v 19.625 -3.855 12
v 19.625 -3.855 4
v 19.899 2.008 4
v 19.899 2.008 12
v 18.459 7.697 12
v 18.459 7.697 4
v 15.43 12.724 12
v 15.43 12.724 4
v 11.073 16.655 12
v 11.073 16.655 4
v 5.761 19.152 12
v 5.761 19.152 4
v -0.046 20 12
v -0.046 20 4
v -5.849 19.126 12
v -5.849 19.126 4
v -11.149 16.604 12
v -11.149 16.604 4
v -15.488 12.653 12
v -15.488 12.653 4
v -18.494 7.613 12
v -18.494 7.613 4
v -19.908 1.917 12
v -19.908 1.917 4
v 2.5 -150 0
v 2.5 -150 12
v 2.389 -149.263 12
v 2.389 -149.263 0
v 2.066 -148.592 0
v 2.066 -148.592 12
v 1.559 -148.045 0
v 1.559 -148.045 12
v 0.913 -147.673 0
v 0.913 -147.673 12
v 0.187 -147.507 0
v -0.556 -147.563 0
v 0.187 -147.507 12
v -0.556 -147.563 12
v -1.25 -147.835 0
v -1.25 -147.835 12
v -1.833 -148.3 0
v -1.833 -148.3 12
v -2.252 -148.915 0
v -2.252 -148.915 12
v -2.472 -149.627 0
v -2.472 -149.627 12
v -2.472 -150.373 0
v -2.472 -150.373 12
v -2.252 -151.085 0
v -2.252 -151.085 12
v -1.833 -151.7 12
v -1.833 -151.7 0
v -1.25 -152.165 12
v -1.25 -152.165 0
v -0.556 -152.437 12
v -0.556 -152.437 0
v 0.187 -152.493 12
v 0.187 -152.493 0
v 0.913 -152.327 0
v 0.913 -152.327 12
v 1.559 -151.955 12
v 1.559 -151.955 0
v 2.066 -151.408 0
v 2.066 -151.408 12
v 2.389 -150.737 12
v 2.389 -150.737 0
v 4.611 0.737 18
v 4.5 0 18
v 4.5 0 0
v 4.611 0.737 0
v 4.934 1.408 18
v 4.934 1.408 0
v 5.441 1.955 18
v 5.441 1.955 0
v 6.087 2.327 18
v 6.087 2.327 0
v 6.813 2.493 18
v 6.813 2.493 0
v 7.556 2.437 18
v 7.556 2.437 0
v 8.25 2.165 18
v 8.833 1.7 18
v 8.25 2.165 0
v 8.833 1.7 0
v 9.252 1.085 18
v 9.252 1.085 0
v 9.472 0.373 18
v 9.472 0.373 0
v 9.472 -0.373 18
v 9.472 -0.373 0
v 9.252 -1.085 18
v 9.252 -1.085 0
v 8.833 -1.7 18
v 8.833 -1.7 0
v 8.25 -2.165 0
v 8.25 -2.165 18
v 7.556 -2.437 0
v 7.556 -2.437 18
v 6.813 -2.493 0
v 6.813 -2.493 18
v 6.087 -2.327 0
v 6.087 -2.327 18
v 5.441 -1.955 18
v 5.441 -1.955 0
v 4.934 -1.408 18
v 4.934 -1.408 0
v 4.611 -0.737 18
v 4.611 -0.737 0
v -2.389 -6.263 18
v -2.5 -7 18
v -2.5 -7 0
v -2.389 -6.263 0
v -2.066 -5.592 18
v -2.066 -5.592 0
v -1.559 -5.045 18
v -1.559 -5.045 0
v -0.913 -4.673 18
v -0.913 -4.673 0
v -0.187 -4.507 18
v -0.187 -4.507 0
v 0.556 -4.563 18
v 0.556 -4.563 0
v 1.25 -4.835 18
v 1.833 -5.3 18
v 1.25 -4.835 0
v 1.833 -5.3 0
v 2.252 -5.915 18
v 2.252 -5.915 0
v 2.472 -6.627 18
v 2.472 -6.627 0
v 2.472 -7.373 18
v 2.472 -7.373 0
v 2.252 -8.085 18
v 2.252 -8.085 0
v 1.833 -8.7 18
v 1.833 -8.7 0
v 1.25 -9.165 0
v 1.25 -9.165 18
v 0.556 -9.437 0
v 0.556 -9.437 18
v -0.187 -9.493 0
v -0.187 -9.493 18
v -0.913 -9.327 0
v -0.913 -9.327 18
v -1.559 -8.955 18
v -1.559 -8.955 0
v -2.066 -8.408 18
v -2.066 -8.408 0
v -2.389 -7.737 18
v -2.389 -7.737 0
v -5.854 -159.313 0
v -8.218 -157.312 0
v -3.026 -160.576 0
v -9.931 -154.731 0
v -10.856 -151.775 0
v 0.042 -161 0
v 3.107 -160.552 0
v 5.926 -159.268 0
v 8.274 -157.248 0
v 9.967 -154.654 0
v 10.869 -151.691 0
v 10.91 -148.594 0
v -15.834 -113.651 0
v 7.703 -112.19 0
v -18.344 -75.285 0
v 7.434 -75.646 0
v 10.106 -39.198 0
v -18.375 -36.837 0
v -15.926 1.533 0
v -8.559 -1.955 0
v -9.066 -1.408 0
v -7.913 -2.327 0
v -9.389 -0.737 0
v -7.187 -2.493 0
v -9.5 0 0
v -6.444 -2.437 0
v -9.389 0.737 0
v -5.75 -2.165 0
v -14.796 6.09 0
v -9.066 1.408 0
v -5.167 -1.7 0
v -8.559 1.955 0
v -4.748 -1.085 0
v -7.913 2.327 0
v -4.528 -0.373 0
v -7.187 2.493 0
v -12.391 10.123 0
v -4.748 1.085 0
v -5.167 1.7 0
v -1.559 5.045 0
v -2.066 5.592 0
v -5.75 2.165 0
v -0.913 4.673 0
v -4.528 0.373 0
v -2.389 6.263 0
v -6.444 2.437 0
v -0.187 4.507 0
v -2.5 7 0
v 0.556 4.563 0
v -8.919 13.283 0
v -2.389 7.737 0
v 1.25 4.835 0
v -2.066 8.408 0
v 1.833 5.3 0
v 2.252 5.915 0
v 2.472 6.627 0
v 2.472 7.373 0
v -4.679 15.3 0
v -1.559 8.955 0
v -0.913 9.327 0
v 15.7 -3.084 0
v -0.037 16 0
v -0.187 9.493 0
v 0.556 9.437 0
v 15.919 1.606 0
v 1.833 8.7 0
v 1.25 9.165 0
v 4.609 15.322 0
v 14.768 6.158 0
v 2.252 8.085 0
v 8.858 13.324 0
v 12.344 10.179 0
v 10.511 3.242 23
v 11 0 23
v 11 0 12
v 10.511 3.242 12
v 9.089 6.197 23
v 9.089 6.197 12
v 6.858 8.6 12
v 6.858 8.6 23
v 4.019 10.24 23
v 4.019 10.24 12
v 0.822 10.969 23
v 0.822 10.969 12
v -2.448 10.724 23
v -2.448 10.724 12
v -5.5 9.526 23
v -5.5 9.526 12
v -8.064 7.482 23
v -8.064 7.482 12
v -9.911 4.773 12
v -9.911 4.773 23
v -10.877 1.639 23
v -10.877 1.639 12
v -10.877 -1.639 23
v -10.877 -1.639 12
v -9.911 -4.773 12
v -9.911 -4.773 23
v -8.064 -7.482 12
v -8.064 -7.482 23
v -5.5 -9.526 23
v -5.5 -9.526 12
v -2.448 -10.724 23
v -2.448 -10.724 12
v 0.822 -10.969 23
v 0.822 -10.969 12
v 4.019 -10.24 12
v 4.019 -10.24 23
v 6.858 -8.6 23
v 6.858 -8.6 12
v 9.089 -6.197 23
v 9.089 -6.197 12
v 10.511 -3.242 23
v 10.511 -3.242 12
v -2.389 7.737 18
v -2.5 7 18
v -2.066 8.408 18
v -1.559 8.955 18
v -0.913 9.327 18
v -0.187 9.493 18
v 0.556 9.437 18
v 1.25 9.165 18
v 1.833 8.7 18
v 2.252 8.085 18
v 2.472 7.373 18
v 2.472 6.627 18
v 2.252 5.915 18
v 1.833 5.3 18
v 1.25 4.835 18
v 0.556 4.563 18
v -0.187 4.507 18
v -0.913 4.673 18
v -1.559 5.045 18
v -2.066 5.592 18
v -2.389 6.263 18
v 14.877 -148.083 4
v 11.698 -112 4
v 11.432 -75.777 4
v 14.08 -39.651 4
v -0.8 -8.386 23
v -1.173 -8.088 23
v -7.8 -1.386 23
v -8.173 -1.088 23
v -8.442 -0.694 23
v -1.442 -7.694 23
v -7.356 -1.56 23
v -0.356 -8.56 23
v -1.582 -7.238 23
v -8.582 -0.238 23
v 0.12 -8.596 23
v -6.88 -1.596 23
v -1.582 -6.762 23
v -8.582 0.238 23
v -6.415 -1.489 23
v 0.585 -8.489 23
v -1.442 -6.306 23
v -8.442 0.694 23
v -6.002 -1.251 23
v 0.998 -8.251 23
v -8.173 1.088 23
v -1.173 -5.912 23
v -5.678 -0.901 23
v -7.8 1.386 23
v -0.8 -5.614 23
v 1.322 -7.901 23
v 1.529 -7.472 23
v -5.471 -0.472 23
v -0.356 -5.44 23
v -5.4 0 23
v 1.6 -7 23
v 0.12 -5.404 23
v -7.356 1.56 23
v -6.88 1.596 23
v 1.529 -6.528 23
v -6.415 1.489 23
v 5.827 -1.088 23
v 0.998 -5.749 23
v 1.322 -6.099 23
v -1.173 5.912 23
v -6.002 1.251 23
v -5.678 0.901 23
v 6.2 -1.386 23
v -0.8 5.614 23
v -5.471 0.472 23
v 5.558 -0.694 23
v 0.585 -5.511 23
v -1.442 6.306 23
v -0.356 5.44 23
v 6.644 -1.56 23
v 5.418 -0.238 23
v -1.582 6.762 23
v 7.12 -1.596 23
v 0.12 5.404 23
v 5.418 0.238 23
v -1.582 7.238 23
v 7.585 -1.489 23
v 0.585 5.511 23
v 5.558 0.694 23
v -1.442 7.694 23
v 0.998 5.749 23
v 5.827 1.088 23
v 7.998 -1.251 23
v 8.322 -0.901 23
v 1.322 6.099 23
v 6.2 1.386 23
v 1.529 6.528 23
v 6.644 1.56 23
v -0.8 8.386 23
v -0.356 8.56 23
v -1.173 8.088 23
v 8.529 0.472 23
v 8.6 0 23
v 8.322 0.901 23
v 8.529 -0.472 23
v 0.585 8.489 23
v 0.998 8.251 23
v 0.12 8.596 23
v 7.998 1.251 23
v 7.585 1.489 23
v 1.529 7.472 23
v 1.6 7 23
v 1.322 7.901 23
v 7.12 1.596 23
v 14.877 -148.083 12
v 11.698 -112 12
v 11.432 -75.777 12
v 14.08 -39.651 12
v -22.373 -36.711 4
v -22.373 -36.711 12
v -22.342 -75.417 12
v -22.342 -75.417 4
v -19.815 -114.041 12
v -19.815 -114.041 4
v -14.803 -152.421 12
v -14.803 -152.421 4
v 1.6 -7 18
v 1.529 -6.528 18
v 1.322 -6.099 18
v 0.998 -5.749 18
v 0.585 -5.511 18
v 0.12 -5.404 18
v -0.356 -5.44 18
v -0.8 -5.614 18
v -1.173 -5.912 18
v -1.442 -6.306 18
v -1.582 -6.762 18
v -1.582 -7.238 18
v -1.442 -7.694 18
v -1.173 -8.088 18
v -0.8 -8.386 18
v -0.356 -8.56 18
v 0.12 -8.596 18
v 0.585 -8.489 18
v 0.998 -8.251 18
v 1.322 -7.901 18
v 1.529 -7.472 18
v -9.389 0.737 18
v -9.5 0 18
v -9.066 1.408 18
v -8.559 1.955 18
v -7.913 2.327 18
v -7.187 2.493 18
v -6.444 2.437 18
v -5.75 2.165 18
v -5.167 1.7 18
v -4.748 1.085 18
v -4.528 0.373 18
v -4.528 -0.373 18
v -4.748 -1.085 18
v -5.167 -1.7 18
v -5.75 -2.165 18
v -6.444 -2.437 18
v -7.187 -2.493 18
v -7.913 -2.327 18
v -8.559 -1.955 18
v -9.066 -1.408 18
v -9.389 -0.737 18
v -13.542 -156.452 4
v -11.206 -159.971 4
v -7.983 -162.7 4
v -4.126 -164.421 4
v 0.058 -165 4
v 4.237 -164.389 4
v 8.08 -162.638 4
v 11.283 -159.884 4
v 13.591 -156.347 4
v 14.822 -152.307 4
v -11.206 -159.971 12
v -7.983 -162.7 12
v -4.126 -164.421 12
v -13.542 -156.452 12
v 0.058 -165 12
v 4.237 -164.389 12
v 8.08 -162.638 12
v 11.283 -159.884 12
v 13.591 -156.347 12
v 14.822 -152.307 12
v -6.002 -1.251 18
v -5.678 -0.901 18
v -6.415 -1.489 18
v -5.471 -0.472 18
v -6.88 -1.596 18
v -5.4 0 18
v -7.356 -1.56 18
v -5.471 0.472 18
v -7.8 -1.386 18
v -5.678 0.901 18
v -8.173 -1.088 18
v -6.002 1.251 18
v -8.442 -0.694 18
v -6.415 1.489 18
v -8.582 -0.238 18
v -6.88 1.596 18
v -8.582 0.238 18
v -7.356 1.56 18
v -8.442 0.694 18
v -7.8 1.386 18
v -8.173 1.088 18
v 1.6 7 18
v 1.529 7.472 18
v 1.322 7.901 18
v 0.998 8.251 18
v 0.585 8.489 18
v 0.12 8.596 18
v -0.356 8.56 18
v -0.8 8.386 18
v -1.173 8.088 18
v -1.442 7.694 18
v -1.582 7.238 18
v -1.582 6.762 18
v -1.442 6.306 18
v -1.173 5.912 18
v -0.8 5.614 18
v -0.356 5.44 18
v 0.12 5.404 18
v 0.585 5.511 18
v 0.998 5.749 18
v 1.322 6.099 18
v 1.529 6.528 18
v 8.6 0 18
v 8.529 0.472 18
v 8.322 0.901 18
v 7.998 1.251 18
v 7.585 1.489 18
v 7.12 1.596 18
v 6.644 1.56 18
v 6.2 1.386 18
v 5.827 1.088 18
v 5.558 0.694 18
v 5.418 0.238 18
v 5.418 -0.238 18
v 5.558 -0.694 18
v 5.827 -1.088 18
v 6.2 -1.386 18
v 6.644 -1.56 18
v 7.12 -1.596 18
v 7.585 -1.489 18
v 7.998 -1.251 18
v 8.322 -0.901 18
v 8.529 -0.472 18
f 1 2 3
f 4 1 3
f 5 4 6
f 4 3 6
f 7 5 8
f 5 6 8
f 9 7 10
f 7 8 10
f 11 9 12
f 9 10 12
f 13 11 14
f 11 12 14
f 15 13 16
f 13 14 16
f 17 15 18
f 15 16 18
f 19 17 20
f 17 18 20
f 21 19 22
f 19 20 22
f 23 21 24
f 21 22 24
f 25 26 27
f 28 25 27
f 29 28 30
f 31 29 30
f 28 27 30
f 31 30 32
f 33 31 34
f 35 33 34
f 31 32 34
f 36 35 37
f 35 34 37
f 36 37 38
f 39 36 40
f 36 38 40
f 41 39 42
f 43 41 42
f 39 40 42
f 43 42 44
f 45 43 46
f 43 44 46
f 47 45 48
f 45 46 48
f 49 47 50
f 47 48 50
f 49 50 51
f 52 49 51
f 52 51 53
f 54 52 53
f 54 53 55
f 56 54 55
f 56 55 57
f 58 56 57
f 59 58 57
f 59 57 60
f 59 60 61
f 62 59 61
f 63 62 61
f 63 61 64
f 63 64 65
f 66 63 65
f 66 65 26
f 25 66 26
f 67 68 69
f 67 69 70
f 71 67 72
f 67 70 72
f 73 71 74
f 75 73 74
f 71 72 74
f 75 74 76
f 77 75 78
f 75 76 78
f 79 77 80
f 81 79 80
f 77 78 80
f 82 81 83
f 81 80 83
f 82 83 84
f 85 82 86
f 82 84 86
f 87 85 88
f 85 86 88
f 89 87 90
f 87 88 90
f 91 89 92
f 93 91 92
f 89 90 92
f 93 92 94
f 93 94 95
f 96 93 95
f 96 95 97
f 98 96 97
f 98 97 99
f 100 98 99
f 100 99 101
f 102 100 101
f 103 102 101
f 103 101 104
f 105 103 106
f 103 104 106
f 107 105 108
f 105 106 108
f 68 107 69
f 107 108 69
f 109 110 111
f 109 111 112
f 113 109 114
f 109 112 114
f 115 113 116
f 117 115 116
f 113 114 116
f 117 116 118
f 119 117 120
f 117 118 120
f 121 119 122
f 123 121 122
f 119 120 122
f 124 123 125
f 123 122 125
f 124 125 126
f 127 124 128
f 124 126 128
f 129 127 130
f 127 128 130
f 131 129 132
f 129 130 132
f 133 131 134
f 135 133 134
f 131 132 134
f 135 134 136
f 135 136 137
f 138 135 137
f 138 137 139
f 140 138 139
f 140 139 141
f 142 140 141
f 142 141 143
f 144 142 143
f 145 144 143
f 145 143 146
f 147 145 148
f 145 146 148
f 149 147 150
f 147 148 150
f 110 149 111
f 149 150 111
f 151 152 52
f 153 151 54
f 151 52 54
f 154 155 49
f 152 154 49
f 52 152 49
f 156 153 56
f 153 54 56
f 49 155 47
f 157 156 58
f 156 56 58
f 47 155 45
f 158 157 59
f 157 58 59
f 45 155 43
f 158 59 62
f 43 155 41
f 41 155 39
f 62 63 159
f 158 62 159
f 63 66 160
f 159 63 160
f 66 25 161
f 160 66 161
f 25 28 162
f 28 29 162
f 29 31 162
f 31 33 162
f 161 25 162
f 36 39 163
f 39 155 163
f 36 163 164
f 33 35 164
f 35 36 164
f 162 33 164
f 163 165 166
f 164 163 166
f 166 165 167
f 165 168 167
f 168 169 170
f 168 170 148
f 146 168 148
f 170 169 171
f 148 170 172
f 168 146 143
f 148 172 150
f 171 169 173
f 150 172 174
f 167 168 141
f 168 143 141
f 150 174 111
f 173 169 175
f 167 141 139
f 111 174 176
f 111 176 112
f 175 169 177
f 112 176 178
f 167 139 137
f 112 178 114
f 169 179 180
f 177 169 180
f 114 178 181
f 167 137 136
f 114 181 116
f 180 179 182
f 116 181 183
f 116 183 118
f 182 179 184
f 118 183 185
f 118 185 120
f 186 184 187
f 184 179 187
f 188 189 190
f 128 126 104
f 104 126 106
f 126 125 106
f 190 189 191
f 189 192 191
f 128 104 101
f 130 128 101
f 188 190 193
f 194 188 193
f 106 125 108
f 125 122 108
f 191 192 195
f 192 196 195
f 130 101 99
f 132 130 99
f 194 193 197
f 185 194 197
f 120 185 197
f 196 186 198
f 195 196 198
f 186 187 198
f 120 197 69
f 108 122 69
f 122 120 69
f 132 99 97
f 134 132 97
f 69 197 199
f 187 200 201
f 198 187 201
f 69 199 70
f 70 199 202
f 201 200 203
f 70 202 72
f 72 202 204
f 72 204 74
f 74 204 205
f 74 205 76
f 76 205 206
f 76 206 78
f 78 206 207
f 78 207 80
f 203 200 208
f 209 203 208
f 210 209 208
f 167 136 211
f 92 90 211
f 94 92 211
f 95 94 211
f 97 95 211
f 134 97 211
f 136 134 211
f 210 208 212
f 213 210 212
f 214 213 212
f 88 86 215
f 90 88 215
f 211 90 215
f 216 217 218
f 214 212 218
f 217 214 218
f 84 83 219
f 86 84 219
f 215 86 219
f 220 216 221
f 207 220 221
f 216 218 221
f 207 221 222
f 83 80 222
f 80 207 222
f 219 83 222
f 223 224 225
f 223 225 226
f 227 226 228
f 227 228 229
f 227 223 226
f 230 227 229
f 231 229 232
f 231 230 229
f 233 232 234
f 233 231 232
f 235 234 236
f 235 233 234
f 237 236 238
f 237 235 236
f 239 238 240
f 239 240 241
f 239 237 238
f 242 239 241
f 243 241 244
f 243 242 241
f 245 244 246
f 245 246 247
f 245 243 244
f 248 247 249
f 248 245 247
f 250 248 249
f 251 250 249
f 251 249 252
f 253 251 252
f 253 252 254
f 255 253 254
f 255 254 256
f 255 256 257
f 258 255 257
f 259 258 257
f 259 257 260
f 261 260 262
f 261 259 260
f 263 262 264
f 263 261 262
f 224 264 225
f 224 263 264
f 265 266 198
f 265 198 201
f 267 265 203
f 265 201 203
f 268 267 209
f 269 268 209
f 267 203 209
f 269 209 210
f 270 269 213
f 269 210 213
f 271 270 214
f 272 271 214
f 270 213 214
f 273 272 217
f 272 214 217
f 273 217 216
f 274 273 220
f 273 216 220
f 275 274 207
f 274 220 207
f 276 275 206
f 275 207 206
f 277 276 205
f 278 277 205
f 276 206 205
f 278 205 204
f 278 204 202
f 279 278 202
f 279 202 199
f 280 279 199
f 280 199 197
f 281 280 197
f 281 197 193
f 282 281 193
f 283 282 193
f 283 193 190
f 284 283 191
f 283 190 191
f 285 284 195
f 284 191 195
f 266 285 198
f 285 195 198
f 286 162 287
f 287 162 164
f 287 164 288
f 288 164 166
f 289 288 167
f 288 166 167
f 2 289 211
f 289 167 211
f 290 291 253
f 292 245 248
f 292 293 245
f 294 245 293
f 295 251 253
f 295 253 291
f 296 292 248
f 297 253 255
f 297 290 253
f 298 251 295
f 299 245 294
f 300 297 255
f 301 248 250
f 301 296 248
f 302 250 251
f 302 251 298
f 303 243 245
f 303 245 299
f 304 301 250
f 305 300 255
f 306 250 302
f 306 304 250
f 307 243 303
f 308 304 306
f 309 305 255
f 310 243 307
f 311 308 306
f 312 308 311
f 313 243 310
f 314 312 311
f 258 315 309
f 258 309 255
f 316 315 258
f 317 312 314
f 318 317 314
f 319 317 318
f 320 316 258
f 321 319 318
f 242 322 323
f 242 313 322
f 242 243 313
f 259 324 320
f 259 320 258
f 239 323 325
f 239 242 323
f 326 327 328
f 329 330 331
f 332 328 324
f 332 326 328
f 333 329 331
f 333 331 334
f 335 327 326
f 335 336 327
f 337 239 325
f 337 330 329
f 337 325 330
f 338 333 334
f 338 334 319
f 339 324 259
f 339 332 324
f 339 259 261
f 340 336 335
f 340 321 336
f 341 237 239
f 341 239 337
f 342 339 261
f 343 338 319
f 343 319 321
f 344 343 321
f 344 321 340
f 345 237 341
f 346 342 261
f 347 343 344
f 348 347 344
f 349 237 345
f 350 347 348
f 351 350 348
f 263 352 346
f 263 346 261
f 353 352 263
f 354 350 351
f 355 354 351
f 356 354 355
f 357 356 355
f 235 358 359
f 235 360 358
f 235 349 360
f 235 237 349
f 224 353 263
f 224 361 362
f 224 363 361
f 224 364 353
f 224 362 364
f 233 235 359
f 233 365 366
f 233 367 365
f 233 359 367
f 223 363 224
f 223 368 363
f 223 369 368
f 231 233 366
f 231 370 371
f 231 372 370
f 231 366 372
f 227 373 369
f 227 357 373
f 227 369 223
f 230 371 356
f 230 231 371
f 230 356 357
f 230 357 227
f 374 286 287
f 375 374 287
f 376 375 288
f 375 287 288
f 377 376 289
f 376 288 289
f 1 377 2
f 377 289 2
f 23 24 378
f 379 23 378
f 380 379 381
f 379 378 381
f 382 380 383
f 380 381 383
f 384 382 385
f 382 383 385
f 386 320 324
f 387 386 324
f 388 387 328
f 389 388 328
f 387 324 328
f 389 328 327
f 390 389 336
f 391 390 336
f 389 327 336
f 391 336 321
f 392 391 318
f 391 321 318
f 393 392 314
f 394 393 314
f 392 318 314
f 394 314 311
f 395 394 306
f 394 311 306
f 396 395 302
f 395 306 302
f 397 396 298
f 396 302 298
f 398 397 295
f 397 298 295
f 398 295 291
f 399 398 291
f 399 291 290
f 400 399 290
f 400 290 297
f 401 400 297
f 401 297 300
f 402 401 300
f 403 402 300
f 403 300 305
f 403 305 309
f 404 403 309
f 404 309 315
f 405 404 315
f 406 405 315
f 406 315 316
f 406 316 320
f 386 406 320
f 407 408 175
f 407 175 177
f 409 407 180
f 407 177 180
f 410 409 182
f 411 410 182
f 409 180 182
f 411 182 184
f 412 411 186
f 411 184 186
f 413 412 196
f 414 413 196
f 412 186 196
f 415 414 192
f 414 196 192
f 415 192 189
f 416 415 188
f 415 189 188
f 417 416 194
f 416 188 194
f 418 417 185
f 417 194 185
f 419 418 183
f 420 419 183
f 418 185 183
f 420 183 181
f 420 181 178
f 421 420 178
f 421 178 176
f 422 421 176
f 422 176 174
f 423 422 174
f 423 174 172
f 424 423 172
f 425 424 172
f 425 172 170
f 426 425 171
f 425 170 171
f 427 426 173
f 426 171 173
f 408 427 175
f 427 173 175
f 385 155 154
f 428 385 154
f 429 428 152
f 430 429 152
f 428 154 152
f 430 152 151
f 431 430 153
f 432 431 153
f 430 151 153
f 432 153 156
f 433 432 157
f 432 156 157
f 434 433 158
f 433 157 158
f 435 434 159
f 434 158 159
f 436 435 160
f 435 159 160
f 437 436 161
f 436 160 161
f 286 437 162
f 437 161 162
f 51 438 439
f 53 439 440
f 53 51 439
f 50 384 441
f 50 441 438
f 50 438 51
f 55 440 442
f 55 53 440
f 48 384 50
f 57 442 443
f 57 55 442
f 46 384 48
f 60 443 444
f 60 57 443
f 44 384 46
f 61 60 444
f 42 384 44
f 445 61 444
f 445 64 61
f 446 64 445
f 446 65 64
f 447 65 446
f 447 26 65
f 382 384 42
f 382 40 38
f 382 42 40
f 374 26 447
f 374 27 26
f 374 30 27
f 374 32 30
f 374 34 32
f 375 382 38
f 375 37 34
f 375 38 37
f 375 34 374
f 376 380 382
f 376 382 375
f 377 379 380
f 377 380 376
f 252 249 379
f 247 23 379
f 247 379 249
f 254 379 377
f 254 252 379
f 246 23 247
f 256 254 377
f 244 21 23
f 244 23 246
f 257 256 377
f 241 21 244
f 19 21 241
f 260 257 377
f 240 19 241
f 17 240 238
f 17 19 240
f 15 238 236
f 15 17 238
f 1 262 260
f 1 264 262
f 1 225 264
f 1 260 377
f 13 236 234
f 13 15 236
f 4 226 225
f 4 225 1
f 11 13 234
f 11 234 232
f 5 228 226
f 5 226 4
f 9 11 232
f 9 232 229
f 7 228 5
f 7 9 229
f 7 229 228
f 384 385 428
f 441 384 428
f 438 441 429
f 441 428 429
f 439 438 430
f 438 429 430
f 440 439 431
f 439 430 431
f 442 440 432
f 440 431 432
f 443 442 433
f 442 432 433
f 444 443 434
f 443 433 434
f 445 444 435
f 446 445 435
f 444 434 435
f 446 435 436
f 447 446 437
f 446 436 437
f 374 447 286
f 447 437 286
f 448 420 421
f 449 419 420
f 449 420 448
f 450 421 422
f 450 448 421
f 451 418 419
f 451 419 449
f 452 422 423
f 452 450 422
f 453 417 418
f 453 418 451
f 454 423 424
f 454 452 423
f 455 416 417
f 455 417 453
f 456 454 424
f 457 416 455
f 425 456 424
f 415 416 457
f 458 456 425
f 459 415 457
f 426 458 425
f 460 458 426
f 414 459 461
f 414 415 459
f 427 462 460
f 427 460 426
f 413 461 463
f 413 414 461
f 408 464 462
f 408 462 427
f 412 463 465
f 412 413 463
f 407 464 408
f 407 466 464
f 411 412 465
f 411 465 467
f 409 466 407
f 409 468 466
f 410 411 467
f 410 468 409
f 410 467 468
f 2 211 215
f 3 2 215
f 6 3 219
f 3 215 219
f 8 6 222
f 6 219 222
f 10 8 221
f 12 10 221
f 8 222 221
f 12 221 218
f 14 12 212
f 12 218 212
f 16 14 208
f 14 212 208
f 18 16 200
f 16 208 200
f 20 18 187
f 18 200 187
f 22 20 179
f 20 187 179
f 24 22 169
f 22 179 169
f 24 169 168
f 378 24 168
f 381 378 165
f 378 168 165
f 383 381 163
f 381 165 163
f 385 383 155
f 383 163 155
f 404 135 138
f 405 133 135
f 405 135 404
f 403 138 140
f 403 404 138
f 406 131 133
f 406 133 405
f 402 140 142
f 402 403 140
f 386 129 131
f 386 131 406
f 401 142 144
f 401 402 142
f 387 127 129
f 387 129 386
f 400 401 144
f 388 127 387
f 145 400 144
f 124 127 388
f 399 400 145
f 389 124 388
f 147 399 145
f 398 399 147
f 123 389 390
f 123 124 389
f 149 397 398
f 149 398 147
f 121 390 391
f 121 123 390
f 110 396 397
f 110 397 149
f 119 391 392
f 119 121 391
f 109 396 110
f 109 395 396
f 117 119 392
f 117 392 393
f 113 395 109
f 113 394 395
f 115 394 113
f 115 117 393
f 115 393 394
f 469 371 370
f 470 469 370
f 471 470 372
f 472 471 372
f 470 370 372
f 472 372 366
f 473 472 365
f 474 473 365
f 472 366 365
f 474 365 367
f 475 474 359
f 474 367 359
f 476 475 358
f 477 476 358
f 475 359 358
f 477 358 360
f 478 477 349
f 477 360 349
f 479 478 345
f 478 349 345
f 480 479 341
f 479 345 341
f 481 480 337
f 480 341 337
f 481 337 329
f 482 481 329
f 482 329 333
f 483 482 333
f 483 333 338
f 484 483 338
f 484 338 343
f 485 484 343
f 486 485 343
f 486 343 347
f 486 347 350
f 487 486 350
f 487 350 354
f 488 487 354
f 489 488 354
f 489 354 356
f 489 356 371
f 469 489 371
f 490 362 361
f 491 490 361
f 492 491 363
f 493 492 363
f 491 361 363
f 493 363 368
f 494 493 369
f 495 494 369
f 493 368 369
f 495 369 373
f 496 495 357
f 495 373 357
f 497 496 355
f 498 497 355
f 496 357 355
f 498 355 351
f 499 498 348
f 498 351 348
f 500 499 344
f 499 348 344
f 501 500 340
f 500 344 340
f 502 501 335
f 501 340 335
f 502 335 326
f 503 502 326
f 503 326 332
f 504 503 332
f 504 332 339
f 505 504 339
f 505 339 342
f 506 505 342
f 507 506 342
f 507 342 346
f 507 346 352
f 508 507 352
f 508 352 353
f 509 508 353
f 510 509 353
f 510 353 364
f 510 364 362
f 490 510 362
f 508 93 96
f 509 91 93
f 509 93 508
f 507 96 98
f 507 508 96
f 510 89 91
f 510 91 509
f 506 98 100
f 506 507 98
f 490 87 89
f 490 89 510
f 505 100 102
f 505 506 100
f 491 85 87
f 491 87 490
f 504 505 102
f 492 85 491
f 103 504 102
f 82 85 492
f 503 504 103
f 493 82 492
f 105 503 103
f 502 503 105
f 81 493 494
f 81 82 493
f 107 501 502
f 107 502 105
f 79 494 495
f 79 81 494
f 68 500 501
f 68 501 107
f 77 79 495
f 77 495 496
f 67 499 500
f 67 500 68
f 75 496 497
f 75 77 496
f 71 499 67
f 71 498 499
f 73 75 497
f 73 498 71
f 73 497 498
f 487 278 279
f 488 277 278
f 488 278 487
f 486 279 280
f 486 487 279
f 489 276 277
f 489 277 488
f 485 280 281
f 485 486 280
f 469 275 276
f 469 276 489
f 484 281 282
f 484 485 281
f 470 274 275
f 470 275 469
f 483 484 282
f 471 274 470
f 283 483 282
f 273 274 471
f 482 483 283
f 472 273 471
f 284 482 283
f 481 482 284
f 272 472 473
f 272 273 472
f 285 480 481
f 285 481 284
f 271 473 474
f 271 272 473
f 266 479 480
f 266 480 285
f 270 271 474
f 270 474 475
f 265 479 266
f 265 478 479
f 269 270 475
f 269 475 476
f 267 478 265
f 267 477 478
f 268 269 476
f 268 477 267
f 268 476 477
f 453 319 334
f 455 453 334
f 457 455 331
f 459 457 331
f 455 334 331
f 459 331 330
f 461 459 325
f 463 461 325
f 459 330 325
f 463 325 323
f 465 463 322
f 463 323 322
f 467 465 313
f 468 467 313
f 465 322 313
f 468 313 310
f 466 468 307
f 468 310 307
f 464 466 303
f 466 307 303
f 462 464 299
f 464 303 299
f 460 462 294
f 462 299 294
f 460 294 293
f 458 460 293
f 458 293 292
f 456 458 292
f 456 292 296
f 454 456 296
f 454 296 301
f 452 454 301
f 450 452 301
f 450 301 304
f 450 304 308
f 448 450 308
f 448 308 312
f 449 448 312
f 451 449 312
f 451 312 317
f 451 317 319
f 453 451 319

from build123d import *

# Parameters (mm, degrees)
BOSS_EXTRUDE1_DEPTH = 12
CHAMFER1_SIZE       = 4
CUT_EXTRUDE1_REACH  = 168.982
SKETCH2_R           = 1.6
CUT_EXTRUDE2_REACH  = 168.982
SKETCH3_R           = 2.5
BOSS_EXTRUDE2_START = 11
SKETCH4_R           = 11
SKETCH4_R_2         = 1.6
BOSS_EXTRUDE2_DEPTH = 11
SKETCH5_R           = 2.5
CUT_EXTRUDE3_DEPTH  = 18


with BuildPart() as part:
    # Sketch1 → Boss-Extrude1 (new body)
    with BuildSketch(Plane.XY):
        with BuildLine():
            ThreePointArc((-14.803345861, -152.420940171), (2.169116424, -164.842335865), (14.877042343, -148.083333333))
            ThreePointArc((14.877042343, -148.083333333), (11.431951297, -75.777407981), (19.625034581, -3.854609929))
            ThreePointArc((19.625034581, -3.854609929), (2.889103385, 19.790226922), (-19.907947882, 1.916666667))
            ThreePointArc((-19.907947882, 1.916666667), (-22.341608419, -75.417043737), (-14.803345861, -152.420940171))
        make_face()
    extrude(amount=BOSS_EXTRUDE1_DEPTH)

    # Chamfer1
    chamfer1_edges = [part.edges().sort_by_distance(p)[0] for p in [
        (2.889103385, 19.790226922, 0),
        (11.431951297, -75.777407981, 0),
        (2.169116424, -164.842335865, 0),
        (-22.341608419, -75.417043737, 0),
    ]]
    chamfer(chamfer1_edges, length=CHAMFER1_SIZE)

    # Sketch2 → Cut-Extrude1 (cut, up to next)
    with BuildSketch(Plane.XY.offset(12), mode=Mode.PRIVATE) as cut_extrude1_sk1:
        with Locations((0, 7)):
            Circle(SKETCH2_R)
    cut_extrude1_tool1 = extrude(cut_extrude1_sk1.sketch, amount=-CUT_EXTRUDE1_REACH, mode=Mode.PRIVATE) & part.part
    # Sketch2 → Cut-Extrude1 (cut, up to next)
    with BuildSketch(Plane.XY.offset(12), mode=Mode.PRIVATE) as cut_extrude1_sk2:
        with Locations((7, 0)):
            Circle(SKETCH2_R)
    cut_extrude1_tool2 = extrude(cut_extrude1_sk2.sketch, amount=-CUT_EXTRUDE1_REACH, mode=Mode.PRIVATE) & part.part
    # Sketch2 → Cut-Extrude1 (cut, up to next)
    with BuildSketch(Plane.XY.offset(12), mode=Mode.PRIVATE) as cut_extrude1_sk3:
        with Locations((0, -7)):
            Circle(SKETCH2_R)
    cut_extrude1_tool3 = extrude(cut_extrude1_sk3.sketch, amount=-CUT_EXTRUDE1_REACH, mode=Mode.PRIVATE) & part.part
    # Sketch2 → Cut-Extrude1 (cut, up to next)
    with BuildSketch(Plane.XY.offset(12), mode=Mode.PRIVATE) as cut_extrude1_sk4:
        with Locations((-7, 0)):
            Circle(SKETCH2_R)
    cut_extrude1_tool4 = extrude(cut_extrude1_sk4.sketch, amount=-CUT_EXTRUDE1_REACH, mode=Mode.PRIVATE) & part.part
    add(cut_extrude1_tool1.solids().sort_by_distance((0, 7, 12))[0], mode=Mode.SUBTRACT)
    add(cut_extrude1_tool2.solids().sort_by_distance((7, 0, 12))[0], mode=Mode.SUBTRACT)
    add(cut_extrude1_tool3.solids().sort_by_distance((0, -7, 12))[0], mode=Mode.SUBTRACT)
    add(cut_extrude1_tool4.solids().sort_by_distance((-7, 0, 12))[0], mode=Mode.SUBTRACT)

    # Sketch3 → Cut-Extrude2 (cut, up to next)
    with BuildSketch(Plane.XY.offset(12), mode=Mode.PRIVATE) as cut_extrude2_sk1:
        with Locations((0, -150)):
            Circle(SKETCH3_R)
    cut_extrude2_tool1 = extrude(cut_extrude2_sk1.sketch, amount=-CUT_EXTRUDE2_REACH, mode=Mode.PRIVATE) & part.part
    add(cut_extrude2_tool1.solids().sort_by_distance((0, -150, 12))[0], mode=Mode.SUBTRACT)

    # Sketch4 → Boss-Extrude2 (add)
    with BuildSketch(Plane.XY.offset(12).offset(BOSS_EXTRUDE2_START)):
        Circle(SKETCH4_R)
        with Locations((7, 0)):
            Circle(SKETCH4_R_2, mode=Mode.SUBTRACT)
        with Locations((0, -7)):
            Circle(SKETCH4_R_2, mode=Mode.SUBTRACT)
        with Locations((-7, 0)):
            Circle(SKETCH4_R_2, mode=Mode.SUBTRACT)
        with Locations((0, 7)):
            Circle(SKETCH4_R_2, mode=Mode.SUBTRACT)
    extrude(amount=-BOSS_EXTRUDE2_DEPTH)

    # Sketch5 → Cut-Extrude3 (cut)
    with BuildSketch(Plane(origin=(0, 0, 0), x_dir=(-1, 0, 0), z_dir=(0, 0, -1))):
        with Locations((0, 7)):
            Circle(SKETCH5_R)
        with Locations((7, 0)):
            Circle(SKETCH5_R)
        with Locations((0, -7)):
            Circle(SKETCH5_R)
        with Locations((-7, 0)):
            Circle(SKETCH5_R)
    extrude(amount=-CUT_EXTRUDE3_DEPTH, mode=Mode.SUBTRACT)


solid = part.part
